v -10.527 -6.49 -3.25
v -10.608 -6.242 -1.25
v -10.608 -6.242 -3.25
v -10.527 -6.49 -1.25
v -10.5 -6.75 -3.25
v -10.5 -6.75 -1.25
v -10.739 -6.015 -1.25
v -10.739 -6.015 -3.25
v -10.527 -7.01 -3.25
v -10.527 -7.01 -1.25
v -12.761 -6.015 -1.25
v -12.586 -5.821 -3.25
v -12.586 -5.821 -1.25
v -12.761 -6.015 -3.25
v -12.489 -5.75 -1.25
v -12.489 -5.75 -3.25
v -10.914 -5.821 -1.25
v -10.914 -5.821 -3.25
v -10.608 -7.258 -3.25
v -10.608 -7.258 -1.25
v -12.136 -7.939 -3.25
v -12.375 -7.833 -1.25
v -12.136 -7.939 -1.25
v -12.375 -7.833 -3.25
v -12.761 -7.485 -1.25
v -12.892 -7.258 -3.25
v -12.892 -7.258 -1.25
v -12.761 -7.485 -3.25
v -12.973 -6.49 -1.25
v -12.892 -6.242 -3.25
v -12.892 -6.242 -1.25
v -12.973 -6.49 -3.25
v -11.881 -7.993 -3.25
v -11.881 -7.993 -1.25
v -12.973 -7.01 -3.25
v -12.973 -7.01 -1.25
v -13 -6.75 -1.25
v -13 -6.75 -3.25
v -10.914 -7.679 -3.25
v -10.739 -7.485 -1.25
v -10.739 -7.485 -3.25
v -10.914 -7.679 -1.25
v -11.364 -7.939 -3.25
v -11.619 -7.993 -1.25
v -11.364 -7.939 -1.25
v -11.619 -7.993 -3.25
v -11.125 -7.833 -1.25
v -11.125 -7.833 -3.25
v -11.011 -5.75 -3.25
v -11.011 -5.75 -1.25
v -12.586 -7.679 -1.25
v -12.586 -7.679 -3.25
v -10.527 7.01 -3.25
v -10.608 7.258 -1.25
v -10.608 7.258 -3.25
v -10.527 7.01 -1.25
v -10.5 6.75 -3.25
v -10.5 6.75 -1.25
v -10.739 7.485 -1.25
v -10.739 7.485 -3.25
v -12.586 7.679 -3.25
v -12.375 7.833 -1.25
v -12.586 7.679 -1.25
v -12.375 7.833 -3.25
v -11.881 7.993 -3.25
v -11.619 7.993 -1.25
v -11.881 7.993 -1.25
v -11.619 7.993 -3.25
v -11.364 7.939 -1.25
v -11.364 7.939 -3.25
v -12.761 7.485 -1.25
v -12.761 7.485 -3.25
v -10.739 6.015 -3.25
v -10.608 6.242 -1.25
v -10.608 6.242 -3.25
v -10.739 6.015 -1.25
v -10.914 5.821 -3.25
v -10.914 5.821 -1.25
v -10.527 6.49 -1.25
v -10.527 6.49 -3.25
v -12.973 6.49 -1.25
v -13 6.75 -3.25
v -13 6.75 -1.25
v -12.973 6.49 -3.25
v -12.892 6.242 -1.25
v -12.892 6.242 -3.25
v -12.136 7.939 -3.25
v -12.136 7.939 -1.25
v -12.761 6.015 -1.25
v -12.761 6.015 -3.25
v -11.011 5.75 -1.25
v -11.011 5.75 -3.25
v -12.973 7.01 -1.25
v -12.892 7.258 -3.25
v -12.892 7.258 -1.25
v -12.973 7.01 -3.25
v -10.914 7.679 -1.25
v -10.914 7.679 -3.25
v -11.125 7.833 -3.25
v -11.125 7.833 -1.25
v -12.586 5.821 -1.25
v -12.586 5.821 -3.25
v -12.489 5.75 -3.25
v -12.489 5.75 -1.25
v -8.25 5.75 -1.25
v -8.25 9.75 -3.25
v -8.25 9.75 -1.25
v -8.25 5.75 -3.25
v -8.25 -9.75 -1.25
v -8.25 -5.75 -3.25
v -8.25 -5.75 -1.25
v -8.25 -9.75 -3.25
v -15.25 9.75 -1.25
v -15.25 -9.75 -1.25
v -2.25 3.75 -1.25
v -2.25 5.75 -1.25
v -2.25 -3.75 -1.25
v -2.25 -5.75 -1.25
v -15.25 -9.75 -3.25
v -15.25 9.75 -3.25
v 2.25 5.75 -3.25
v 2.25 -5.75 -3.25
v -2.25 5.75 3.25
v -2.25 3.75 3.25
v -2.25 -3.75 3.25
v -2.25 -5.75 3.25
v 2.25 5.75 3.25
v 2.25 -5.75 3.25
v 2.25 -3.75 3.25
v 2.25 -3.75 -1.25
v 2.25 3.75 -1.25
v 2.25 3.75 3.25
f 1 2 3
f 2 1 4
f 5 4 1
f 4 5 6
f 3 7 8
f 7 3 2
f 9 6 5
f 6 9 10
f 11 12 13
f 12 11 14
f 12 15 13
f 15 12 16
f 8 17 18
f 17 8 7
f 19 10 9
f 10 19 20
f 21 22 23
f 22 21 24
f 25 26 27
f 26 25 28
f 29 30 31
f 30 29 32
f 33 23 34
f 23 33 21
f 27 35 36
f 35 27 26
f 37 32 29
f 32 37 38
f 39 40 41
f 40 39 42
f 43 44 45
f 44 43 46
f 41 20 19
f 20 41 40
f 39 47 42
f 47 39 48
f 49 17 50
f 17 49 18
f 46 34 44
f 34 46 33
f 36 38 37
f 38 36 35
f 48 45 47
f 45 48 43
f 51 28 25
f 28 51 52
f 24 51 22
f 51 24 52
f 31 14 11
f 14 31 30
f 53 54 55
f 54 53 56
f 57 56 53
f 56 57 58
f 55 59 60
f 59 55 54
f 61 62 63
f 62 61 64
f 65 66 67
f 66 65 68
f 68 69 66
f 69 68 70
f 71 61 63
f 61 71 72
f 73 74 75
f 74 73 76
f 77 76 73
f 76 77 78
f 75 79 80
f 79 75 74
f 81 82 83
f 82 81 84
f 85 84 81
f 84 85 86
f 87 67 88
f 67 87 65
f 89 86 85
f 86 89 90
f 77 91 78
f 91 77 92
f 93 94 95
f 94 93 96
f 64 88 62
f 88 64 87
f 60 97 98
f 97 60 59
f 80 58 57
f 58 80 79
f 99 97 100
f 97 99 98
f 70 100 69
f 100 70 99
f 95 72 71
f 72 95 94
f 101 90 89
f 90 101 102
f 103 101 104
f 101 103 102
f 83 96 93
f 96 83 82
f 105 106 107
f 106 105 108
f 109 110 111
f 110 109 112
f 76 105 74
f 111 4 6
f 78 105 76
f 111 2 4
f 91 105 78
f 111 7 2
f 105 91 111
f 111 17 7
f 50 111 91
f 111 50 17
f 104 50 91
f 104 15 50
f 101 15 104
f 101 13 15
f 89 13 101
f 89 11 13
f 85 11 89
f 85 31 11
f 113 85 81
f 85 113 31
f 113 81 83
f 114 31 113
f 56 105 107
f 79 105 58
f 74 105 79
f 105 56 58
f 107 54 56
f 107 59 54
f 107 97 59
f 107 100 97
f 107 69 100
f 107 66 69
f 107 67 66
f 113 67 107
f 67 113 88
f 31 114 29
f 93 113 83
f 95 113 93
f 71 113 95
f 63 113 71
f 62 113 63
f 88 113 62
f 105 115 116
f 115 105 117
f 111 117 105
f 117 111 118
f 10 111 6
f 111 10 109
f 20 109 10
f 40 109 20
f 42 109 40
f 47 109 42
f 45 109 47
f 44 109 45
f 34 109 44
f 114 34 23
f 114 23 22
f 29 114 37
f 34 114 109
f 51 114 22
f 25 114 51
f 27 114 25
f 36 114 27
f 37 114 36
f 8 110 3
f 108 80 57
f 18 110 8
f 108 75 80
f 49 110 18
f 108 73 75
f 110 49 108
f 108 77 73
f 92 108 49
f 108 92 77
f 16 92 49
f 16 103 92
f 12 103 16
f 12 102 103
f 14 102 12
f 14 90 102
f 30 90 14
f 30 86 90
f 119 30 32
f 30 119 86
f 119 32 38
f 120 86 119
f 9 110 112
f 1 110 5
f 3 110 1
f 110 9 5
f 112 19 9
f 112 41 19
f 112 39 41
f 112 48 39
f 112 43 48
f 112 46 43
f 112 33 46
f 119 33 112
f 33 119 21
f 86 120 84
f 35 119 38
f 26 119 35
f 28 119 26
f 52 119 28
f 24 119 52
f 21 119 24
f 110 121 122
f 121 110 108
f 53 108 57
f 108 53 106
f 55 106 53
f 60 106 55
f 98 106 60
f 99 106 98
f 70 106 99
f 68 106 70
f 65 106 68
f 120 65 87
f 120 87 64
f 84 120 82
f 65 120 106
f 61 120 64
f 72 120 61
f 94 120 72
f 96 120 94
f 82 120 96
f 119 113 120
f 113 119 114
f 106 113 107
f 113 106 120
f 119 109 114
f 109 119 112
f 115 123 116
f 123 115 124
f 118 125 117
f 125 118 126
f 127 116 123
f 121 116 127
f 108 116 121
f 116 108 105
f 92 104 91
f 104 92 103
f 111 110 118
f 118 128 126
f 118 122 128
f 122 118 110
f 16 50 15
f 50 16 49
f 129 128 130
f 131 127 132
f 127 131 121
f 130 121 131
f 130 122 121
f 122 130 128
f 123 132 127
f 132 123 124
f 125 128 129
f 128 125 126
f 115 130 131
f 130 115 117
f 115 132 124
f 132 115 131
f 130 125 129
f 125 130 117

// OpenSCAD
$fn = 30;
wall = 2;
d_sz_x = 4.5;
d_sz_y = 3*2.5;
d_sz_z = 2.5;
gap_sz_z = 1;

ex_sz_x = 12;
ex_sz_y = d_sz_y + 2 * wall;


translate([(-d_sz_x-ex_sz_x)/2, 0, -(d_sz_z+wall)/2]) {
  cube([ex_sz_x, ex_sz_y, wall], center=true);
  translate([-(ex_sz_x-5)/2, 0, 0]) {
    difference() {
      cube([ex_sz_x-5, ex_sz_y+8, wall], center=true);
      for(ysgn=[-1,1]) {
        translate([0, ysgn*(ex_sz_y+2)/2, 0]) {
          cylinder(d=2.5, h=10, center=true);
        }
      }
    }
  }
}
difference() {
  cube([d_sz_x, d_sz_y+2*wall, d_sz_z+2*wall], center=true);
  cube([d_sz_x, d_sz_y, d_sz_z], center=true);
  translate([0, 0, d_sz_z/2+wall/2]) {
    cube([d_sz_x, d_sz_y, wall], center=true);
  }
}
